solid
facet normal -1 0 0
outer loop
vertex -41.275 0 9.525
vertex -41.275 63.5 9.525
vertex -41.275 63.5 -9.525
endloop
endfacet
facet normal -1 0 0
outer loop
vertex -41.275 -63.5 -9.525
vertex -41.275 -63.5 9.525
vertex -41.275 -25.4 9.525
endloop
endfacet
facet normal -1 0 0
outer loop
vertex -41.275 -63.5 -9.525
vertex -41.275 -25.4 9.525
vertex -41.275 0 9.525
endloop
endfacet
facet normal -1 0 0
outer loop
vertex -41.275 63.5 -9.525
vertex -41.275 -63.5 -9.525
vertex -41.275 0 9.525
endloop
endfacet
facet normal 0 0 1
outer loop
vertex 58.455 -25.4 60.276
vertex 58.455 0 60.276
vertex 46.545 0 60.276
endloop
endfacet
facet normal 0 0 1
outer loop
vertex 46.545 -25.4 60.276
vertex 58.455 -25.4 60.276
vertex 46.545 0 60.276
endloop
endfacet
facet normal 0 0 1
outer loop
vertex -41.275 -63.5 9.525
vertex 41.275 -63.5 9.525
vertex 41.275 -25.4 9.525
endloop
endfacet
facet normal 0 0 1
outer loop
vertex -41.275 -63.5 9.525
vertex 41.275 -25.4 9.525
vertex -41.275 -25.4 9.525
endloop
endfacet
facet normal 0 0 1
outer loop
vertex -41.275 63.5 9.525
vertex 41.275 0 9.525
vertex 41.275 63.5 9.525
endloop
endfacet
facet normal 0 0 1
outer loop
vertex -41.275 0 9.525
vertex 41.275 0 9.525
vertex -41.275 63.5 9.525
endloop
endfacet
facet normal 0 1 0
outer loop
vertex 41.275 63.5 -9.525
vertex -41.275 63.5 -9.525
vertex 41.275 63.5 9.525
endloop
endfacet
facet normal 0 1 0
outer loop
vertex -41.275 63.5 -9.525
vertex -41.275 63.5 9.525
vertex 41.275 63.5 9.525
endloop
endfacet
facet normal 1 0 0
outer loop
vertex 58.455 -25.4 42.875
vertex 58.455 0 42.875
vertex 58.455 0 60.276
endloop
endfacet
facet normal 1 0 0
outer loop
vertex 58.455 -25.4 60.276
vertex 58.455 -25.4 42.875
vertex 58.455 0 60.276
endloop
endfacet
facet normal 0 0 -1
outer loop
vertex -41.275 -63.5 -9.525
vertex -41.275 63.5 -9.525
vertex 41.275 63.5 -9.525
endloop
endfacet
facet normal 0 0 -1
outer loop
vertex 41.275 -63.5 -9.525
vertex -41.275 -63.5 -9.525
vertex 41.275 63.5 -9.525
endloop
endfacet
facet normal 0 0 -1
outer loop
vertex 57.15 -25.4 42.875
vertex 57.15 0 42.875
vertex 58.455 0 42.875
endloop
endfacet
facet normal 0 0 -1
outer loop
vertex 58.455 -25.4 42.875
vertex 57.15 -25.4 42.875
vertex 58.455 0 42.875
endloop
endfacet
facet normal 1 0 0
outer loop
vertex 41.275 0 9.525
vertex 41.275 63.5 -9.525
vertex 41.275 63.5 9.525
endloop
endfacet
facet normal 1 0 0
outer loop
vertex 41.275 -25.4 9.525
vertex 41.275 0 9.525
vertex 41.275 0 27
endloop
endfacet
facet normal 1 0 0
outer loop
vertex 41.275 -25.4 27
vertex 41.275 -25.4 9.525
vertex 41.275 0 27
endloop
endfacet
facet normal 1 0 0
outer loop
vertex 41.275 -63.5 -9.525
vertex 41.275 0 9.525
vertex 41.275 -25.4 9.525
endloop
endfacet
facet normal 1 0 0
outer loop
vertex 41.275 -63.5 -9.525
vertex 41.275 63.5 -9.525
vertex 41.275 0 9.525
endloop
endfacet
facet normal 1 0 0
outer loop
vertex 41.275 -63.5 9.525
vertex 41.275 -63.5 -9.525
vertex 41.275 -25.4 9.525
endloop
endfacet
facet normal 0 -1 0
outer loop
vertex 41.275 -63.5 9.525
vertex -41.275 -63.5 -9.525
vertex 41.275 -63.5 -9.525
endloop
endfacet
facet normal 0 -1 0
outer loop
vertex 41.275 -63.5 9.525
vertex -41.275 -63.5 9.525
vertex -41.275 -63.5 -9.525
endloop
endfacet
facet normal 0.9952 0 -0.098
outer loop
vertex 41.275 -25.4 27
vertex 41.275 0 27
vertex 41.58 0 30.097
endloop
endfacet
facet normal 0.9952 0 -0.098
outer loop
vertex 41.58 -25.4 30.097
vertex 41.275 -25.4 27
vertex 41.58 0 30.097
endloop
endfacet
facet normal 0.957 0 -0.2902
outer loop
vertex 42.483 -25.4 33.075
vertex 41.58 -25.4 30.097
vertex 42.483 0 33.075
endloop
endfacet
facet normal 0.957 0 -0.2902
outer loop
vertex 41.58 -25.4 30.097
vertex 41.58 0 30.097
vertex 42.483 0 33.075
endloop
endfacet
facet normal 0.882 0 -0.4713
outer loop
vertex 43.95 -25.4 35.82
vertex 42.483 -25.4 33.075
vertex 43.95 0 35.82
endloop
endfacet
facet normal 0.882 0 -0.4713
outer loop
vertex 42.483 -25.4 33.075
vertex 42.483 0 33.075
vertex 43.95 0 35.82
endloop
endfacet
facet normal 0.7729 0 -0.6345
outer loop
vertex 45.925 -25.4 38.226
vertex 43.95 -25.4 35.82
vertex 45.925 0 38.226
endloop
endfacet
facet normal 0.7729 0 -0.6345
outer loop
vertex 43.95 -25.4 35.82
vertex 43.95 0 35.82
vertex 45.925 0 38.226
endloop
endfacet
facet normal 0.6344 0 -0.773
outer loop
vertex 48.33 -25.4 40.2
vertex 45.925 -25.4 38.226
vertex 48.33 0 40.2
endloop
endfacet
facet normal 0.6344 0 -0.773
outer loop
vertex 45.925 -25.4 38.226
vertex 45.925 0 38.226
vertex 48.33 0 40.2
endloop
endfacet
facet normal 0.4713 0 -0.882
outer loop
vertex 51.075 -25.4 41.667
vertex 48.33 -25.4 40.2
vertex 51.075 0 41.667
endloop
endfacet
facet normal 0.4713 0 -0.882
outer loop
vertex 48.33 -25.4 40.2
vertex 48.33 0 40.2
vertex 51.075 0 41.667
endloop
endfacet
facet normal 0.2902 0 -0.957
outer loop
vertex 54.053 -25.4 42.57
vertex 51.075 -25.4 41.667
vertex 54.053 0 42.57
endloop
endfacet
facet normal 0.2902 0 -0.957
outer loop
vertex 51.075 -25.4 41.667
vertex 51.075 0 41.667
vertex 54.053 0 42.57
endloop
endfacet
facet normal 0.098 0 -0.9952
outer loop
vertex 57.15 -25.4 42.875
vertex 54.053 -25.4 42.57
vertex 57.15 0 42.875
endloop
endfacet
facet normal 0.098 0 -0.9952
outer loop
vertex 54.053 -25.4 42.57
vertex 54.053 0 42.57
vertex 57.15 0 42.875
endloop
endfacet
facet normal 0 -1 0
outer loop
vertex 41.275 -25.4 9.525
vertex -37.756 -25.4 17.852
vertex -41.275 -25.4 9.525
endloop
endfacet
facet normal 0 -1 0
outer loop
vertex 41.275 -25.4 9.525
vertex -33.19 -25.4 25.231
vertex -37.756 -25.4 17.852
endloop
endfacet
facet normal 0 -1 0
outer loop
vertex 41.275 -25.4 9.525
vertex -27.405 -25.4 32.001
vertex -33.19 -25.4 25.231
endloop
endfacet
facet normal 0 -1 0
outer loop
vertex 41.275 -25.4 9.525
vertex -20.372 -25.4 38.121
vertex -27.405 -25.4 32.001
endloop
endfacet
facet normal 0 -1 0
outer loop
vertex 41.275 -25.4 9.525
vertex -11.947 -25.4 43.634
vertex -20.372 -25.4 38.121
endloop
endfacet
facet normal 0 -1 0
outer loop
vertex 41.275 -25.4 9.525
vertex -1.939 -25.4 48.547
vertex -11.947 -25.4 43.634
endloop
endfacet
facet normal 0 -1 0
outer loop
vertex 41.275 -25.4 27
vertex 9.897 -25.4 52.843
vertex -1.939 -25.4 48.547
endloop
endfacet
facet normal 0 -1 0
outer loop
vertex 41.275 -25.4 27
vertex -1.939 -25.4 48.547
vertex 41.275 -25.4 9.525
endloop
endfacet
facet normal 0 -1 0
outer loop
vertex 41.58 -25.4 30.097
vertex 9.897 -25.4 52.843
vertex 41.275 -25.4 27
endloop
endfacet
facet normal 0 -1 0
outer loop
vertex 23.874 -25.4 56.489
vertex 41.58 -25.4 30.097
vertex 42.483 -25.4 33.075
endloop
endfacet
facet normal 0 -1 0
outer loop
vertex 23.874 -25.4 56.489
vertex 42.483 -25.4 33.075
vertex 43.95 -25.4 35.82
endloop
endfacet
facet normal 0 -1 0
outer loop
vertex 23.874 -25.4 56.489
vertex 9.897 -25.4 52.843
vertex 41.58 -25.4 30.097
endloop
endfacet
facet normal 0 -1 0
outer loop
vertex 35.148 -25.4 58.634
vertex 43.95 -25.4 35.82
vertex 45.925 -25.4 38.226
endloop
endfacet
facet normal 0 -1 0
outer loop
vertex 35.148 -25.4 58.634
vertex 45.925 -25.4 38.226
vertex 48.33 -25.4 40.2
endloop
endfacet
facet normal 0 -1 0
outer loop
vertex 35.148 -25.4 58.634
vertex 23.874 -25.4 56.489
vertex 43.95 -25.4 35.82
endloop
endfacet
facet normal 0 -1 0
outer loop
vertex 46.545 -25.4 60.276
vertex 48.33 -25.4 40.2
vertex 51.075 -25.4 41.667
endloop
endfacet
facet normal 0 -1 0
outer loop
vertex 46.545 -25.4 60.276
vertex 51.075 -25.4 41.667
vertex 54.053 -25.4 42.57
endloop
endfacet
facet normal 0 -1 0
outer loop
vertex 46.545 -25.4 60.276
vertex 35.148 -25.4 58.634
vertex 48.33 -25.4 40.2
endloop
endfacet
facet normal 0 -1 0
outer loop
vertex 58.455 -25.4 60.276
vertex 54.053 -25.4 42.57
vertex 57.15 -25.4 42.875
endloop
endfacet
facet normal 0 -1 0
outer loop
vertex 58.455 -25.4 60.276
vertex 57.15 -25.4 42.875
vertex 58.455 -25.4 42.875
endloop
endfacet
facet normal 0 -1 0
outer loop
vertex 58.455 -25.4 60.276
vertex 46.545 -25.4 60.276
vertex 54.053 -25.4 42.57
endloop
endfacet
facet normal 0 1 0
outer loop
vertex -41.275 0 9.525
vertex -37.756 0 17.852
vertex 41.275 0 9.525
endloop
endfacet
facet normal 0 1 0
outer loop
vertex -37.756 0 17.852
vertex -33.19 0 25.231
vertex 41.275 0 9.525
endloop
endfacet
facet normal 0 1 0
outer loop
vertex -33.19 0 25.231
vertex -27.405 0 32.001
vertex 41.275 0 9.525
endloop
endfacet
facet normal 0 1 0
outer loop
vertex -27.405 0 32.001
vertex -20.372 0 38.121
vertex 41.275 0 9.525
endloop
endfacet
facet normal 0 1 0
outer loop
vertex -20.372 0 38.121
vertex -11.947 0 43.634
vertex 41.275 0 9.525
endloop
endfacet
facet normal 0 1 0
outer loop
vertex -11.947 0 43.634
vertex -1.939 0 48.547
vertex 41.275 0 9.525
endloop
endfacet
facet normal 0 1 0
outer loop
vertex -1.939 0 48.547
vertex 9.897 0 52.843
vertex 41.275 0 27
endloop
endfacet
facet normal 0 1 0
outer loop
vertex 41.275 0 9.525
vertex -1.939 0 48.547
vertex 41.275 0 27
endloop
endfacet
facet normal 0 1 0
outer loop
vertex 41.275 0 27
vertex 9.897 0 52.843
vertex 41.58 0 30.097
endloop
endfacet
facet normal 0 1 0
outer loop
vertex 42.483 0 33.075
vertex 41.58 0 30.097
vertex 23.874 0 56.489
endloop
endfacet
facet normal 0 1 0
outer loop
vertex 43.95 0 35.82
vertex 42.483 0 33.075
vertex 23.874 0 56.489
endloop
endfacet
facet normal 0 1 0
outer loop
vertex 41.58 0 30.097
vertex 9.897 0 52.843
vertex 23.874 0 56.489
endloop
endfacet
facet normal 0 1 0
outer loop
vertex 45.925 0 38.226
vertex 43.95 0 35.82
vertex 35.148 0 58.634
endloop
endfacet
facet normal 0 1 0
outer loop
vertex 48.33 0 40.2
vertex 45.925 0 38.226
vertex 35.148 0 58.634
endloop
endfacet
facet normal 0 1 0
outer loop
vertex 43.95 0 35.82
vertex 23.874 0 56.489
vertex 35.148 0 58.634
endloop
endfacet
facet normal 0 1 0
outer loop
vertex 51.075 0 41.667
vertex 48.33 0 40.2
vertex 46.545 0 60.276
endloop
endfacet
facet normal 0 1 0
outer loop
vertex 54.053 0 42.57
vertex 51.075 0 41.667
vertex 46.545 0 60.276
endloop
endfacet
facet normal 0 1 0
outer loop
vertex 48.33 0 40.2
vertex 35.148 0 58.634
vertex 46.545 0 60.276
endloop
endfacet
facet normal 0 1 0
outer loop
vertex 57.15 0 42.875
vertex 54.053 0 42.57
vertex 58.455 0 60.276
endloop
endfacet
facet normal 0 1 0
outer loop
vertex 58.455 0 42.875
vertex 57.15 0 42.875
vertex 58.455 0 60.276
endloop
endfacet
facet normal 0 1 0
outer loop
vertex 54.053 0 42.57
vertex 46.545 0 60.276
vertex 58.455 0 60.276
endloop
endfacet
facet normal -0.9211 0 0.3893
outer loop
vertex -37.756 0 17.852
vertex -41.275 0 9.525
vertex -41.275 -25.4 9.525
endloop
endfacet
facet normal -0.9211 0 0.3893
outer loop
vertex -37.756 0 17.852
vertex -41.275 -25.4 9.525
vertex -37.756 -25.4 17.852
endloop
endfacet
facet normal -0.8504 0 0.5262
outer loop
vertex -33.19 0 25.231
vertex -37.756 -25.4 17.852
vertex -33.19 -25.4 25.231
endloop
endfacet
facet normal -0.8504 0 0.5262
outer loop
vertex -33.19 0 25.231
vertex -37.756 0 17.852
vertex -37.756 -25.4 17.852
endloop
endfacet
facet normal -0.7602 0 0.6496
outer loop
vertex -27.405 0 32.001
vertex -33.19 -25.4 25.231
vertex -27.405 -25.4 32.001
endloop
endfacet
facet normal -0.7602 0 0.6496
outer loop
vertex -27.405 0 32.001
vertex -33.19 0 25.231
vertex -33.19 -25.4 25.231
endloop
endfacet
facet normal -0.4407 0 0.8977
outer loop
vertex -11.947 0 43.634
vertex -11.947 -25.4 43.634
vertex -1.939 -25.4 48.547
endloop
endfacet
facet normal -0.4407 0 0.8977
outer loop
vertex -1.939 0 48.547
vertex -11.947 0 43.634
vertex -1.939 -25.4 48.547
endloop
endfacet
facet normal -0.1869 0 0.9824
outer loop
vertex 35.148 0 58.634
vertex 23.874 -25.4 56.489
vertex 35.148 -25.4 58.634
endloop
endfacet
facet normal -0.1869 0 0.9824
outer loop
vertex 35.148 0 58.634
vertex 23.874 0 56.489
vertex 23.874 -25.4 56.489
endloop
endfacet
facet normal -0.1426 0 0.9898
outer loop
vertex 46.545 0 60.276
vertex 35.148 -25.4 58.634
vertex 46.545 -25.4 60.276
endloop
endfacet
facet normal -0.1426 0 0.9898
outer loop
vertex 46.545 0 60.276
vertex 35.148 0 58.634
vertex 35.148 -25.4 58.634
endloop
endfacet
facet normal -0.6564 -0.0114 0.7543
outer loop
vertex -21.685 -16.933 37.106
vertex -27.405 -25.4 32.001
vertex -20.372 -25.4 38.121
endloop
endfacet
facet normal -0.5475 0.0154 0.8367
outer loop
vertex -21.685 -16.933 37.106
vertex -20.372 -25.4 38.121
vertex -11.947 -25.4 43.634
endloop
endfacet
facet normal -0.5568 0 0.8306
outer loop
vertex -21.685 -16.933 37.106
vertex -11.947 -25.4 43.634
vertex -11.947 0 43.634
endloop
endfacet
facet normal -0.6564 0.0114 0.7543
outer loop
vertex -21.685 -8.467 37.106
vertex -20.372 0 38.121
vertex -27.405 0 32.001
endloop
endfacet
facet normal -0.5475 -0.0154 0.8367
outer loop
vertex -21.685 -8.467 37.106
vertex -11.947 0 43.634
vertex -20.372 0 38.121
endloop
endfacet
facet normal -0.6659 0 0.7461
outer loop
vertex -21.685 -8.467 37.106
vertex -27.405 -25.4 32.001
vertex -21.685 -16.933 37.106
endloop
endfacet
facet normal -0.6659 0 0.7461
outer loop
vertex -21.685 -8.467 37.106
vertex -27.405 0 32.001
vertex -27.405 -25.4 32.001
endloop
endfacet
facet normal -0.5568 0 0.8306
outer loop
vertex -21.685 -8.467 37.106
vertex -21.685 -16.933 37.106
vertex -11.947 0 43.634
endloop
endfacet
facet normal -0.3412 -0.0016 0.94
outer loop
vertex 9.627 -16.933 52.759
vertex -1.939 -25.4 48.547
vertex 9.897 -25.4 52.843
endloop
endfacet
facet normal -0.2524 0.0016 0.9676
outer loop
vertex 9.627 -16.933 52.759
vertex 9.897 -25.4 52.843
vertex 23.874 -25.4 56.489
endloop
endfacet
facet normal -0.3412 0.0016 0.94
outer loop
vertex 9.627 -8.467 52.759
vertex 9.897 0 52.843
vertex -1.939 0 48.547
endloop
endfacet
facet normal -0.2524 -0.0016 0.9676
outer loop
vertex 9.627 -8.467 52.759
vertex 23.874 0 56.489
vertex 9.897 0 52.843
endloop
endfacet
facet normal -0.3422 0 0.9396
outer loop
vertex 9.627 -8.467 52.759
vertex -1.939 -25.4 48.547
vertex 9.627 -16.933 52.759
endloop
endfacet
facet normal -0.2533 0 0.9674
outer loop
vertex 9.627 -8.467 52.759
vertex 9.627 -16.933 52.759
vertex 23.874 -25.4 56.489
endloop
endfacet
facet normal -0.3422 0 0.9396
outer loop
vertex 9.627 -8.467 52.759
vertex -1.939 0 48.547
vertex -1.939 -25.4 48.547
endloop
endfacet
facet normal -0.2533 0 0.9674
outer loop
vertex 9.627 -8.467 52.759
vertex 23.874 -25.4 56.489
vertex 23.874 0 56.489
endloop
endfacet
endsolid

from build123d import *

# Parameters (mm, degrees)
F1_DEPTH = 63.5
F2_DEPTH = 25.4


with BuildPart() as f1:
    # F0 (on Front) → F1 (new body, symmetric)
    with BuildSketch(Plane.XZ):
        Polygon((-41.275, -9.525), (41.275, -9.525), (41.275, 9.525), (22.225, 9.525), (-41.275, 9.525), align=None)
    extrude(amount=F1_DEPTH, both=True)

    # F0 (on Front) → F2 (join)
    with BuildSketch(Plane.XZ):
        with BuildLine():
            Line((22.225, 9.525), (41.275, 9.525))
            Line((41.275, 9.525), (41.275, 27.0002))
            ThreePointArc((41.275, 27.0002), (45.92468, 38.22552), (57.15, 42.8752))
            Line((57.15, 42.8752), (58.455468, 42.8752))
            Line((58.455468, 42.8752), (58.455468, 60.276241))
            Line((58.455468, 60.276241), (46.545251, 60.276241))
            ThreePointArc((46.545251, 60.276241), (28.953134, 47.608266), (22.225, 27.0002))
            Line((22.225, 27.0002), (22.225, 9.525))
        make_face()
        with BuildLine():
            add(Edge.make_bspline(
                [(-41.275, 9.525), (-29.582771, 44.333433), (8.860969, 55.563996), (46.545251, 60.276241)],
                knots=[0, 0, 0, 0, 101.430197, 101.430197, 101.430197, 101.430197], degree=3))
            Line((-41.275, 9.525), (22.225, 9.525))
            Line((22.225, 9.525), (22.225, 27.0002))
            ThreePointArc((22.225, 27.0002), (28.953134, 47.608266), (46.545251, 60.276241))
        make_face()
    extrude(amount=F2_DEPTH)


solid = f1.part
